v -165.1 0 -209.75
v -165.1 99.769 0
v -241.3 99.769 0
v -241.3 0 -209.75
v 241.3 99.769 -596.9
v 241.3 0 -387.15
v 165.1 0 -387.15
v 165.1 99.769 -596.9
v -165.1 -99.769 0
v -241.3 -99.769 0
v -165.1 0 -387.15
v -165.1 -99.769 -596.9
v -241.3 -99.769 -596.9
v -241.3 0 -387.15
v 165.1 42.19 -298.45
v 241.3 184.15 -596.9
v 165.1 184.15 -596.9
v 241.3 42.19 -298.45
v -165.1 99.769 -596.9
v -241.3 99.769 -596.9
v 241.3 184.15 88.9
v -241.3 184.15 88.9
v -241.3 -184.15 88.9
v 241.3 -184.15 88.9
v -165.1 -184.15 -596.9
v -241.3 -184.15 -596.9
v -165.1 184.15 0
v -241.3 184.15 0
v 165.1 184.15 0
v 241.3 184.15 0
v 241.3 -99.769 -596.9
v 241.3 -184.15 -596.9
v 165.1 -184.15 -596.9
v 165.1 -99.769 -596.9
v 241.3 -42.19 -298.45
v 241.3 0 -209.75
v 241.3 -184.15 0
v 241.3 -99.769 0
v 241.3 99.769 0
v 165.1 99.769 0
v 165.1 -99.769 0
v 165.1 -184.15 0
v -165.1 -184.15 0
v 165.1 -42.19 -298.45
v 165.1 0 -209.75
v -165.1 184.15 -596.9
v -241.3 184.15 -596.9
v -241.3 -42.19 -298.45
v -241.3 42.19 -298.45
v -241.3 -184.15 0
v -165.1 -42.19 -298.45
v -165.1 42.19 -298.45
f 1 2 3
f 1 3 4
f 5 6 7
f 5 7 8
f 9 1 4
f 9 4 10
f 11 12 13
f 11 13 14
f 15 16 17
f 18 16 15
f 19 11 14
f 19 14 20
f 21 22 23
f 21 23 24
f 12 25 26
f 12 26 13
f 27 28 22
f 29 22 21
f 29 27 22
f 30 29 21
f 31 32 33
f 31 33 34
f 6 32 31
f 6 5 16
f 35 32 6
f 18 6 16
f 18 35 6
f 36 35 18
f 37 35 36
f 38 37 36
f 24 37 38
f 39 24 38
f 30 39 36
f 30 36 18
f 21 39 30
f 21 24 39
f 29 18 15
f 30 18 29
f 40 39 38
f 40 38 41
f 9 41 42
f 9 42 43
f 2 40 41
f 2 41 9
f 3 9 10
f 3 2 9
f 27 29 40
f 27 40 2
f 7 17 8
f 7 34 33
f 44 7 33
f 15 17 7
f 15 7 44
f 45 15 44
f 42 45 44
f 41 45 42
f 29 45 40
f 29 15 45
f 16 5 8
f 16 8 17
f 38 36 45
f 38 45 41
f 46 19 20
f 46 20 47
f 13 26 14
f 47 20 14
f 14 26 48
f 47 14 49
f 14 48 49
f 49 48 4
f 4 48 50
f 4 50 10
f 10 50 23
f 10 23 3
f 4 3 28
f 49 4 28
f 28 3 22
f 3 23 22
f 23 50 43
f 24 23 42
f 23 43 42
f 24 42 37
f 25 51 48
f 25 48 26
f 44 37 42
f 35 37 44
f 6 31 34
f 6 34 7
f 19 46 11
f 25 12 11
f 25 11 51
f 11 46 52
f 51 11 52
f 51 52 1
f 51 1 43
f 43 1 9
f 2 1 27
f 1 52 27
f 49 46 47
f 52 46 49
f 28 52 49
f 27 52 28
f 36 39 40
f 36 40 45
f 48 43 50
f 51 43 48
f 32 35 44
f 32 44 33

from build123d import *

# Parameters (mm, degrees)
F0_W     = 482.6
F0_H     = 368.3
F1_DEPTH = 88.9
F3_DEPTH = 482.6
F4_W     = 330.2
F4_H     = 596.9
F5_DEPTH = 368.301


with BuildPart() as f1:
    # F0 (on Top) → F1 (new body)
    with BuildSketch(Plane.XY):
        Rectangle(F0_W, F0_H)
    extrude(amount=F1_DEPTH)

    # F2 (on face) → F3 (join)
    with BuildSketch(Plane.YZ.offset(241.3)):
        Polygon((-99.7690824552, 0), (-184.15, 0), (-42.1904587724, -298.45), (0, -209.7504852528), align=None)
        Polygon((99.7690824552, 0), (0, -209.7504852528), (42.1904587724, -298.45), (184.15, 0), align=None)
        Polygon((0, -209.7504852528), (-42.1904587724, -298.45), (0, -387.1495147472), (42.1904587724, -298.45), align=None)
        Polygon((42.1904587724, -298.45), (0, -387.1495147472), (99.7690824552, -596.9), (184.15, -596.9), align=None)
        Polygon((0, -387.1495147472), (-42.1904587724, -298.45), (-184.15, -596.9), (-99.7690824552, -596.9), align=None)
    extrude(amount=-F3_DEPTH)

    # F4 (on face) → F5 (cut, through all)
    with BuildSketch(Plane(origin=(0, 184.15, 0), x_dir=(-1, 0, 0), z_dir=(0, 1, 0))):
        with Locations((0, -298.45)):
            Rectangle(F4_W, F4_H)
    extrude(amount=-F5_DEPTH, mode=Mode.SUBTRACT)


solid = f1.part
